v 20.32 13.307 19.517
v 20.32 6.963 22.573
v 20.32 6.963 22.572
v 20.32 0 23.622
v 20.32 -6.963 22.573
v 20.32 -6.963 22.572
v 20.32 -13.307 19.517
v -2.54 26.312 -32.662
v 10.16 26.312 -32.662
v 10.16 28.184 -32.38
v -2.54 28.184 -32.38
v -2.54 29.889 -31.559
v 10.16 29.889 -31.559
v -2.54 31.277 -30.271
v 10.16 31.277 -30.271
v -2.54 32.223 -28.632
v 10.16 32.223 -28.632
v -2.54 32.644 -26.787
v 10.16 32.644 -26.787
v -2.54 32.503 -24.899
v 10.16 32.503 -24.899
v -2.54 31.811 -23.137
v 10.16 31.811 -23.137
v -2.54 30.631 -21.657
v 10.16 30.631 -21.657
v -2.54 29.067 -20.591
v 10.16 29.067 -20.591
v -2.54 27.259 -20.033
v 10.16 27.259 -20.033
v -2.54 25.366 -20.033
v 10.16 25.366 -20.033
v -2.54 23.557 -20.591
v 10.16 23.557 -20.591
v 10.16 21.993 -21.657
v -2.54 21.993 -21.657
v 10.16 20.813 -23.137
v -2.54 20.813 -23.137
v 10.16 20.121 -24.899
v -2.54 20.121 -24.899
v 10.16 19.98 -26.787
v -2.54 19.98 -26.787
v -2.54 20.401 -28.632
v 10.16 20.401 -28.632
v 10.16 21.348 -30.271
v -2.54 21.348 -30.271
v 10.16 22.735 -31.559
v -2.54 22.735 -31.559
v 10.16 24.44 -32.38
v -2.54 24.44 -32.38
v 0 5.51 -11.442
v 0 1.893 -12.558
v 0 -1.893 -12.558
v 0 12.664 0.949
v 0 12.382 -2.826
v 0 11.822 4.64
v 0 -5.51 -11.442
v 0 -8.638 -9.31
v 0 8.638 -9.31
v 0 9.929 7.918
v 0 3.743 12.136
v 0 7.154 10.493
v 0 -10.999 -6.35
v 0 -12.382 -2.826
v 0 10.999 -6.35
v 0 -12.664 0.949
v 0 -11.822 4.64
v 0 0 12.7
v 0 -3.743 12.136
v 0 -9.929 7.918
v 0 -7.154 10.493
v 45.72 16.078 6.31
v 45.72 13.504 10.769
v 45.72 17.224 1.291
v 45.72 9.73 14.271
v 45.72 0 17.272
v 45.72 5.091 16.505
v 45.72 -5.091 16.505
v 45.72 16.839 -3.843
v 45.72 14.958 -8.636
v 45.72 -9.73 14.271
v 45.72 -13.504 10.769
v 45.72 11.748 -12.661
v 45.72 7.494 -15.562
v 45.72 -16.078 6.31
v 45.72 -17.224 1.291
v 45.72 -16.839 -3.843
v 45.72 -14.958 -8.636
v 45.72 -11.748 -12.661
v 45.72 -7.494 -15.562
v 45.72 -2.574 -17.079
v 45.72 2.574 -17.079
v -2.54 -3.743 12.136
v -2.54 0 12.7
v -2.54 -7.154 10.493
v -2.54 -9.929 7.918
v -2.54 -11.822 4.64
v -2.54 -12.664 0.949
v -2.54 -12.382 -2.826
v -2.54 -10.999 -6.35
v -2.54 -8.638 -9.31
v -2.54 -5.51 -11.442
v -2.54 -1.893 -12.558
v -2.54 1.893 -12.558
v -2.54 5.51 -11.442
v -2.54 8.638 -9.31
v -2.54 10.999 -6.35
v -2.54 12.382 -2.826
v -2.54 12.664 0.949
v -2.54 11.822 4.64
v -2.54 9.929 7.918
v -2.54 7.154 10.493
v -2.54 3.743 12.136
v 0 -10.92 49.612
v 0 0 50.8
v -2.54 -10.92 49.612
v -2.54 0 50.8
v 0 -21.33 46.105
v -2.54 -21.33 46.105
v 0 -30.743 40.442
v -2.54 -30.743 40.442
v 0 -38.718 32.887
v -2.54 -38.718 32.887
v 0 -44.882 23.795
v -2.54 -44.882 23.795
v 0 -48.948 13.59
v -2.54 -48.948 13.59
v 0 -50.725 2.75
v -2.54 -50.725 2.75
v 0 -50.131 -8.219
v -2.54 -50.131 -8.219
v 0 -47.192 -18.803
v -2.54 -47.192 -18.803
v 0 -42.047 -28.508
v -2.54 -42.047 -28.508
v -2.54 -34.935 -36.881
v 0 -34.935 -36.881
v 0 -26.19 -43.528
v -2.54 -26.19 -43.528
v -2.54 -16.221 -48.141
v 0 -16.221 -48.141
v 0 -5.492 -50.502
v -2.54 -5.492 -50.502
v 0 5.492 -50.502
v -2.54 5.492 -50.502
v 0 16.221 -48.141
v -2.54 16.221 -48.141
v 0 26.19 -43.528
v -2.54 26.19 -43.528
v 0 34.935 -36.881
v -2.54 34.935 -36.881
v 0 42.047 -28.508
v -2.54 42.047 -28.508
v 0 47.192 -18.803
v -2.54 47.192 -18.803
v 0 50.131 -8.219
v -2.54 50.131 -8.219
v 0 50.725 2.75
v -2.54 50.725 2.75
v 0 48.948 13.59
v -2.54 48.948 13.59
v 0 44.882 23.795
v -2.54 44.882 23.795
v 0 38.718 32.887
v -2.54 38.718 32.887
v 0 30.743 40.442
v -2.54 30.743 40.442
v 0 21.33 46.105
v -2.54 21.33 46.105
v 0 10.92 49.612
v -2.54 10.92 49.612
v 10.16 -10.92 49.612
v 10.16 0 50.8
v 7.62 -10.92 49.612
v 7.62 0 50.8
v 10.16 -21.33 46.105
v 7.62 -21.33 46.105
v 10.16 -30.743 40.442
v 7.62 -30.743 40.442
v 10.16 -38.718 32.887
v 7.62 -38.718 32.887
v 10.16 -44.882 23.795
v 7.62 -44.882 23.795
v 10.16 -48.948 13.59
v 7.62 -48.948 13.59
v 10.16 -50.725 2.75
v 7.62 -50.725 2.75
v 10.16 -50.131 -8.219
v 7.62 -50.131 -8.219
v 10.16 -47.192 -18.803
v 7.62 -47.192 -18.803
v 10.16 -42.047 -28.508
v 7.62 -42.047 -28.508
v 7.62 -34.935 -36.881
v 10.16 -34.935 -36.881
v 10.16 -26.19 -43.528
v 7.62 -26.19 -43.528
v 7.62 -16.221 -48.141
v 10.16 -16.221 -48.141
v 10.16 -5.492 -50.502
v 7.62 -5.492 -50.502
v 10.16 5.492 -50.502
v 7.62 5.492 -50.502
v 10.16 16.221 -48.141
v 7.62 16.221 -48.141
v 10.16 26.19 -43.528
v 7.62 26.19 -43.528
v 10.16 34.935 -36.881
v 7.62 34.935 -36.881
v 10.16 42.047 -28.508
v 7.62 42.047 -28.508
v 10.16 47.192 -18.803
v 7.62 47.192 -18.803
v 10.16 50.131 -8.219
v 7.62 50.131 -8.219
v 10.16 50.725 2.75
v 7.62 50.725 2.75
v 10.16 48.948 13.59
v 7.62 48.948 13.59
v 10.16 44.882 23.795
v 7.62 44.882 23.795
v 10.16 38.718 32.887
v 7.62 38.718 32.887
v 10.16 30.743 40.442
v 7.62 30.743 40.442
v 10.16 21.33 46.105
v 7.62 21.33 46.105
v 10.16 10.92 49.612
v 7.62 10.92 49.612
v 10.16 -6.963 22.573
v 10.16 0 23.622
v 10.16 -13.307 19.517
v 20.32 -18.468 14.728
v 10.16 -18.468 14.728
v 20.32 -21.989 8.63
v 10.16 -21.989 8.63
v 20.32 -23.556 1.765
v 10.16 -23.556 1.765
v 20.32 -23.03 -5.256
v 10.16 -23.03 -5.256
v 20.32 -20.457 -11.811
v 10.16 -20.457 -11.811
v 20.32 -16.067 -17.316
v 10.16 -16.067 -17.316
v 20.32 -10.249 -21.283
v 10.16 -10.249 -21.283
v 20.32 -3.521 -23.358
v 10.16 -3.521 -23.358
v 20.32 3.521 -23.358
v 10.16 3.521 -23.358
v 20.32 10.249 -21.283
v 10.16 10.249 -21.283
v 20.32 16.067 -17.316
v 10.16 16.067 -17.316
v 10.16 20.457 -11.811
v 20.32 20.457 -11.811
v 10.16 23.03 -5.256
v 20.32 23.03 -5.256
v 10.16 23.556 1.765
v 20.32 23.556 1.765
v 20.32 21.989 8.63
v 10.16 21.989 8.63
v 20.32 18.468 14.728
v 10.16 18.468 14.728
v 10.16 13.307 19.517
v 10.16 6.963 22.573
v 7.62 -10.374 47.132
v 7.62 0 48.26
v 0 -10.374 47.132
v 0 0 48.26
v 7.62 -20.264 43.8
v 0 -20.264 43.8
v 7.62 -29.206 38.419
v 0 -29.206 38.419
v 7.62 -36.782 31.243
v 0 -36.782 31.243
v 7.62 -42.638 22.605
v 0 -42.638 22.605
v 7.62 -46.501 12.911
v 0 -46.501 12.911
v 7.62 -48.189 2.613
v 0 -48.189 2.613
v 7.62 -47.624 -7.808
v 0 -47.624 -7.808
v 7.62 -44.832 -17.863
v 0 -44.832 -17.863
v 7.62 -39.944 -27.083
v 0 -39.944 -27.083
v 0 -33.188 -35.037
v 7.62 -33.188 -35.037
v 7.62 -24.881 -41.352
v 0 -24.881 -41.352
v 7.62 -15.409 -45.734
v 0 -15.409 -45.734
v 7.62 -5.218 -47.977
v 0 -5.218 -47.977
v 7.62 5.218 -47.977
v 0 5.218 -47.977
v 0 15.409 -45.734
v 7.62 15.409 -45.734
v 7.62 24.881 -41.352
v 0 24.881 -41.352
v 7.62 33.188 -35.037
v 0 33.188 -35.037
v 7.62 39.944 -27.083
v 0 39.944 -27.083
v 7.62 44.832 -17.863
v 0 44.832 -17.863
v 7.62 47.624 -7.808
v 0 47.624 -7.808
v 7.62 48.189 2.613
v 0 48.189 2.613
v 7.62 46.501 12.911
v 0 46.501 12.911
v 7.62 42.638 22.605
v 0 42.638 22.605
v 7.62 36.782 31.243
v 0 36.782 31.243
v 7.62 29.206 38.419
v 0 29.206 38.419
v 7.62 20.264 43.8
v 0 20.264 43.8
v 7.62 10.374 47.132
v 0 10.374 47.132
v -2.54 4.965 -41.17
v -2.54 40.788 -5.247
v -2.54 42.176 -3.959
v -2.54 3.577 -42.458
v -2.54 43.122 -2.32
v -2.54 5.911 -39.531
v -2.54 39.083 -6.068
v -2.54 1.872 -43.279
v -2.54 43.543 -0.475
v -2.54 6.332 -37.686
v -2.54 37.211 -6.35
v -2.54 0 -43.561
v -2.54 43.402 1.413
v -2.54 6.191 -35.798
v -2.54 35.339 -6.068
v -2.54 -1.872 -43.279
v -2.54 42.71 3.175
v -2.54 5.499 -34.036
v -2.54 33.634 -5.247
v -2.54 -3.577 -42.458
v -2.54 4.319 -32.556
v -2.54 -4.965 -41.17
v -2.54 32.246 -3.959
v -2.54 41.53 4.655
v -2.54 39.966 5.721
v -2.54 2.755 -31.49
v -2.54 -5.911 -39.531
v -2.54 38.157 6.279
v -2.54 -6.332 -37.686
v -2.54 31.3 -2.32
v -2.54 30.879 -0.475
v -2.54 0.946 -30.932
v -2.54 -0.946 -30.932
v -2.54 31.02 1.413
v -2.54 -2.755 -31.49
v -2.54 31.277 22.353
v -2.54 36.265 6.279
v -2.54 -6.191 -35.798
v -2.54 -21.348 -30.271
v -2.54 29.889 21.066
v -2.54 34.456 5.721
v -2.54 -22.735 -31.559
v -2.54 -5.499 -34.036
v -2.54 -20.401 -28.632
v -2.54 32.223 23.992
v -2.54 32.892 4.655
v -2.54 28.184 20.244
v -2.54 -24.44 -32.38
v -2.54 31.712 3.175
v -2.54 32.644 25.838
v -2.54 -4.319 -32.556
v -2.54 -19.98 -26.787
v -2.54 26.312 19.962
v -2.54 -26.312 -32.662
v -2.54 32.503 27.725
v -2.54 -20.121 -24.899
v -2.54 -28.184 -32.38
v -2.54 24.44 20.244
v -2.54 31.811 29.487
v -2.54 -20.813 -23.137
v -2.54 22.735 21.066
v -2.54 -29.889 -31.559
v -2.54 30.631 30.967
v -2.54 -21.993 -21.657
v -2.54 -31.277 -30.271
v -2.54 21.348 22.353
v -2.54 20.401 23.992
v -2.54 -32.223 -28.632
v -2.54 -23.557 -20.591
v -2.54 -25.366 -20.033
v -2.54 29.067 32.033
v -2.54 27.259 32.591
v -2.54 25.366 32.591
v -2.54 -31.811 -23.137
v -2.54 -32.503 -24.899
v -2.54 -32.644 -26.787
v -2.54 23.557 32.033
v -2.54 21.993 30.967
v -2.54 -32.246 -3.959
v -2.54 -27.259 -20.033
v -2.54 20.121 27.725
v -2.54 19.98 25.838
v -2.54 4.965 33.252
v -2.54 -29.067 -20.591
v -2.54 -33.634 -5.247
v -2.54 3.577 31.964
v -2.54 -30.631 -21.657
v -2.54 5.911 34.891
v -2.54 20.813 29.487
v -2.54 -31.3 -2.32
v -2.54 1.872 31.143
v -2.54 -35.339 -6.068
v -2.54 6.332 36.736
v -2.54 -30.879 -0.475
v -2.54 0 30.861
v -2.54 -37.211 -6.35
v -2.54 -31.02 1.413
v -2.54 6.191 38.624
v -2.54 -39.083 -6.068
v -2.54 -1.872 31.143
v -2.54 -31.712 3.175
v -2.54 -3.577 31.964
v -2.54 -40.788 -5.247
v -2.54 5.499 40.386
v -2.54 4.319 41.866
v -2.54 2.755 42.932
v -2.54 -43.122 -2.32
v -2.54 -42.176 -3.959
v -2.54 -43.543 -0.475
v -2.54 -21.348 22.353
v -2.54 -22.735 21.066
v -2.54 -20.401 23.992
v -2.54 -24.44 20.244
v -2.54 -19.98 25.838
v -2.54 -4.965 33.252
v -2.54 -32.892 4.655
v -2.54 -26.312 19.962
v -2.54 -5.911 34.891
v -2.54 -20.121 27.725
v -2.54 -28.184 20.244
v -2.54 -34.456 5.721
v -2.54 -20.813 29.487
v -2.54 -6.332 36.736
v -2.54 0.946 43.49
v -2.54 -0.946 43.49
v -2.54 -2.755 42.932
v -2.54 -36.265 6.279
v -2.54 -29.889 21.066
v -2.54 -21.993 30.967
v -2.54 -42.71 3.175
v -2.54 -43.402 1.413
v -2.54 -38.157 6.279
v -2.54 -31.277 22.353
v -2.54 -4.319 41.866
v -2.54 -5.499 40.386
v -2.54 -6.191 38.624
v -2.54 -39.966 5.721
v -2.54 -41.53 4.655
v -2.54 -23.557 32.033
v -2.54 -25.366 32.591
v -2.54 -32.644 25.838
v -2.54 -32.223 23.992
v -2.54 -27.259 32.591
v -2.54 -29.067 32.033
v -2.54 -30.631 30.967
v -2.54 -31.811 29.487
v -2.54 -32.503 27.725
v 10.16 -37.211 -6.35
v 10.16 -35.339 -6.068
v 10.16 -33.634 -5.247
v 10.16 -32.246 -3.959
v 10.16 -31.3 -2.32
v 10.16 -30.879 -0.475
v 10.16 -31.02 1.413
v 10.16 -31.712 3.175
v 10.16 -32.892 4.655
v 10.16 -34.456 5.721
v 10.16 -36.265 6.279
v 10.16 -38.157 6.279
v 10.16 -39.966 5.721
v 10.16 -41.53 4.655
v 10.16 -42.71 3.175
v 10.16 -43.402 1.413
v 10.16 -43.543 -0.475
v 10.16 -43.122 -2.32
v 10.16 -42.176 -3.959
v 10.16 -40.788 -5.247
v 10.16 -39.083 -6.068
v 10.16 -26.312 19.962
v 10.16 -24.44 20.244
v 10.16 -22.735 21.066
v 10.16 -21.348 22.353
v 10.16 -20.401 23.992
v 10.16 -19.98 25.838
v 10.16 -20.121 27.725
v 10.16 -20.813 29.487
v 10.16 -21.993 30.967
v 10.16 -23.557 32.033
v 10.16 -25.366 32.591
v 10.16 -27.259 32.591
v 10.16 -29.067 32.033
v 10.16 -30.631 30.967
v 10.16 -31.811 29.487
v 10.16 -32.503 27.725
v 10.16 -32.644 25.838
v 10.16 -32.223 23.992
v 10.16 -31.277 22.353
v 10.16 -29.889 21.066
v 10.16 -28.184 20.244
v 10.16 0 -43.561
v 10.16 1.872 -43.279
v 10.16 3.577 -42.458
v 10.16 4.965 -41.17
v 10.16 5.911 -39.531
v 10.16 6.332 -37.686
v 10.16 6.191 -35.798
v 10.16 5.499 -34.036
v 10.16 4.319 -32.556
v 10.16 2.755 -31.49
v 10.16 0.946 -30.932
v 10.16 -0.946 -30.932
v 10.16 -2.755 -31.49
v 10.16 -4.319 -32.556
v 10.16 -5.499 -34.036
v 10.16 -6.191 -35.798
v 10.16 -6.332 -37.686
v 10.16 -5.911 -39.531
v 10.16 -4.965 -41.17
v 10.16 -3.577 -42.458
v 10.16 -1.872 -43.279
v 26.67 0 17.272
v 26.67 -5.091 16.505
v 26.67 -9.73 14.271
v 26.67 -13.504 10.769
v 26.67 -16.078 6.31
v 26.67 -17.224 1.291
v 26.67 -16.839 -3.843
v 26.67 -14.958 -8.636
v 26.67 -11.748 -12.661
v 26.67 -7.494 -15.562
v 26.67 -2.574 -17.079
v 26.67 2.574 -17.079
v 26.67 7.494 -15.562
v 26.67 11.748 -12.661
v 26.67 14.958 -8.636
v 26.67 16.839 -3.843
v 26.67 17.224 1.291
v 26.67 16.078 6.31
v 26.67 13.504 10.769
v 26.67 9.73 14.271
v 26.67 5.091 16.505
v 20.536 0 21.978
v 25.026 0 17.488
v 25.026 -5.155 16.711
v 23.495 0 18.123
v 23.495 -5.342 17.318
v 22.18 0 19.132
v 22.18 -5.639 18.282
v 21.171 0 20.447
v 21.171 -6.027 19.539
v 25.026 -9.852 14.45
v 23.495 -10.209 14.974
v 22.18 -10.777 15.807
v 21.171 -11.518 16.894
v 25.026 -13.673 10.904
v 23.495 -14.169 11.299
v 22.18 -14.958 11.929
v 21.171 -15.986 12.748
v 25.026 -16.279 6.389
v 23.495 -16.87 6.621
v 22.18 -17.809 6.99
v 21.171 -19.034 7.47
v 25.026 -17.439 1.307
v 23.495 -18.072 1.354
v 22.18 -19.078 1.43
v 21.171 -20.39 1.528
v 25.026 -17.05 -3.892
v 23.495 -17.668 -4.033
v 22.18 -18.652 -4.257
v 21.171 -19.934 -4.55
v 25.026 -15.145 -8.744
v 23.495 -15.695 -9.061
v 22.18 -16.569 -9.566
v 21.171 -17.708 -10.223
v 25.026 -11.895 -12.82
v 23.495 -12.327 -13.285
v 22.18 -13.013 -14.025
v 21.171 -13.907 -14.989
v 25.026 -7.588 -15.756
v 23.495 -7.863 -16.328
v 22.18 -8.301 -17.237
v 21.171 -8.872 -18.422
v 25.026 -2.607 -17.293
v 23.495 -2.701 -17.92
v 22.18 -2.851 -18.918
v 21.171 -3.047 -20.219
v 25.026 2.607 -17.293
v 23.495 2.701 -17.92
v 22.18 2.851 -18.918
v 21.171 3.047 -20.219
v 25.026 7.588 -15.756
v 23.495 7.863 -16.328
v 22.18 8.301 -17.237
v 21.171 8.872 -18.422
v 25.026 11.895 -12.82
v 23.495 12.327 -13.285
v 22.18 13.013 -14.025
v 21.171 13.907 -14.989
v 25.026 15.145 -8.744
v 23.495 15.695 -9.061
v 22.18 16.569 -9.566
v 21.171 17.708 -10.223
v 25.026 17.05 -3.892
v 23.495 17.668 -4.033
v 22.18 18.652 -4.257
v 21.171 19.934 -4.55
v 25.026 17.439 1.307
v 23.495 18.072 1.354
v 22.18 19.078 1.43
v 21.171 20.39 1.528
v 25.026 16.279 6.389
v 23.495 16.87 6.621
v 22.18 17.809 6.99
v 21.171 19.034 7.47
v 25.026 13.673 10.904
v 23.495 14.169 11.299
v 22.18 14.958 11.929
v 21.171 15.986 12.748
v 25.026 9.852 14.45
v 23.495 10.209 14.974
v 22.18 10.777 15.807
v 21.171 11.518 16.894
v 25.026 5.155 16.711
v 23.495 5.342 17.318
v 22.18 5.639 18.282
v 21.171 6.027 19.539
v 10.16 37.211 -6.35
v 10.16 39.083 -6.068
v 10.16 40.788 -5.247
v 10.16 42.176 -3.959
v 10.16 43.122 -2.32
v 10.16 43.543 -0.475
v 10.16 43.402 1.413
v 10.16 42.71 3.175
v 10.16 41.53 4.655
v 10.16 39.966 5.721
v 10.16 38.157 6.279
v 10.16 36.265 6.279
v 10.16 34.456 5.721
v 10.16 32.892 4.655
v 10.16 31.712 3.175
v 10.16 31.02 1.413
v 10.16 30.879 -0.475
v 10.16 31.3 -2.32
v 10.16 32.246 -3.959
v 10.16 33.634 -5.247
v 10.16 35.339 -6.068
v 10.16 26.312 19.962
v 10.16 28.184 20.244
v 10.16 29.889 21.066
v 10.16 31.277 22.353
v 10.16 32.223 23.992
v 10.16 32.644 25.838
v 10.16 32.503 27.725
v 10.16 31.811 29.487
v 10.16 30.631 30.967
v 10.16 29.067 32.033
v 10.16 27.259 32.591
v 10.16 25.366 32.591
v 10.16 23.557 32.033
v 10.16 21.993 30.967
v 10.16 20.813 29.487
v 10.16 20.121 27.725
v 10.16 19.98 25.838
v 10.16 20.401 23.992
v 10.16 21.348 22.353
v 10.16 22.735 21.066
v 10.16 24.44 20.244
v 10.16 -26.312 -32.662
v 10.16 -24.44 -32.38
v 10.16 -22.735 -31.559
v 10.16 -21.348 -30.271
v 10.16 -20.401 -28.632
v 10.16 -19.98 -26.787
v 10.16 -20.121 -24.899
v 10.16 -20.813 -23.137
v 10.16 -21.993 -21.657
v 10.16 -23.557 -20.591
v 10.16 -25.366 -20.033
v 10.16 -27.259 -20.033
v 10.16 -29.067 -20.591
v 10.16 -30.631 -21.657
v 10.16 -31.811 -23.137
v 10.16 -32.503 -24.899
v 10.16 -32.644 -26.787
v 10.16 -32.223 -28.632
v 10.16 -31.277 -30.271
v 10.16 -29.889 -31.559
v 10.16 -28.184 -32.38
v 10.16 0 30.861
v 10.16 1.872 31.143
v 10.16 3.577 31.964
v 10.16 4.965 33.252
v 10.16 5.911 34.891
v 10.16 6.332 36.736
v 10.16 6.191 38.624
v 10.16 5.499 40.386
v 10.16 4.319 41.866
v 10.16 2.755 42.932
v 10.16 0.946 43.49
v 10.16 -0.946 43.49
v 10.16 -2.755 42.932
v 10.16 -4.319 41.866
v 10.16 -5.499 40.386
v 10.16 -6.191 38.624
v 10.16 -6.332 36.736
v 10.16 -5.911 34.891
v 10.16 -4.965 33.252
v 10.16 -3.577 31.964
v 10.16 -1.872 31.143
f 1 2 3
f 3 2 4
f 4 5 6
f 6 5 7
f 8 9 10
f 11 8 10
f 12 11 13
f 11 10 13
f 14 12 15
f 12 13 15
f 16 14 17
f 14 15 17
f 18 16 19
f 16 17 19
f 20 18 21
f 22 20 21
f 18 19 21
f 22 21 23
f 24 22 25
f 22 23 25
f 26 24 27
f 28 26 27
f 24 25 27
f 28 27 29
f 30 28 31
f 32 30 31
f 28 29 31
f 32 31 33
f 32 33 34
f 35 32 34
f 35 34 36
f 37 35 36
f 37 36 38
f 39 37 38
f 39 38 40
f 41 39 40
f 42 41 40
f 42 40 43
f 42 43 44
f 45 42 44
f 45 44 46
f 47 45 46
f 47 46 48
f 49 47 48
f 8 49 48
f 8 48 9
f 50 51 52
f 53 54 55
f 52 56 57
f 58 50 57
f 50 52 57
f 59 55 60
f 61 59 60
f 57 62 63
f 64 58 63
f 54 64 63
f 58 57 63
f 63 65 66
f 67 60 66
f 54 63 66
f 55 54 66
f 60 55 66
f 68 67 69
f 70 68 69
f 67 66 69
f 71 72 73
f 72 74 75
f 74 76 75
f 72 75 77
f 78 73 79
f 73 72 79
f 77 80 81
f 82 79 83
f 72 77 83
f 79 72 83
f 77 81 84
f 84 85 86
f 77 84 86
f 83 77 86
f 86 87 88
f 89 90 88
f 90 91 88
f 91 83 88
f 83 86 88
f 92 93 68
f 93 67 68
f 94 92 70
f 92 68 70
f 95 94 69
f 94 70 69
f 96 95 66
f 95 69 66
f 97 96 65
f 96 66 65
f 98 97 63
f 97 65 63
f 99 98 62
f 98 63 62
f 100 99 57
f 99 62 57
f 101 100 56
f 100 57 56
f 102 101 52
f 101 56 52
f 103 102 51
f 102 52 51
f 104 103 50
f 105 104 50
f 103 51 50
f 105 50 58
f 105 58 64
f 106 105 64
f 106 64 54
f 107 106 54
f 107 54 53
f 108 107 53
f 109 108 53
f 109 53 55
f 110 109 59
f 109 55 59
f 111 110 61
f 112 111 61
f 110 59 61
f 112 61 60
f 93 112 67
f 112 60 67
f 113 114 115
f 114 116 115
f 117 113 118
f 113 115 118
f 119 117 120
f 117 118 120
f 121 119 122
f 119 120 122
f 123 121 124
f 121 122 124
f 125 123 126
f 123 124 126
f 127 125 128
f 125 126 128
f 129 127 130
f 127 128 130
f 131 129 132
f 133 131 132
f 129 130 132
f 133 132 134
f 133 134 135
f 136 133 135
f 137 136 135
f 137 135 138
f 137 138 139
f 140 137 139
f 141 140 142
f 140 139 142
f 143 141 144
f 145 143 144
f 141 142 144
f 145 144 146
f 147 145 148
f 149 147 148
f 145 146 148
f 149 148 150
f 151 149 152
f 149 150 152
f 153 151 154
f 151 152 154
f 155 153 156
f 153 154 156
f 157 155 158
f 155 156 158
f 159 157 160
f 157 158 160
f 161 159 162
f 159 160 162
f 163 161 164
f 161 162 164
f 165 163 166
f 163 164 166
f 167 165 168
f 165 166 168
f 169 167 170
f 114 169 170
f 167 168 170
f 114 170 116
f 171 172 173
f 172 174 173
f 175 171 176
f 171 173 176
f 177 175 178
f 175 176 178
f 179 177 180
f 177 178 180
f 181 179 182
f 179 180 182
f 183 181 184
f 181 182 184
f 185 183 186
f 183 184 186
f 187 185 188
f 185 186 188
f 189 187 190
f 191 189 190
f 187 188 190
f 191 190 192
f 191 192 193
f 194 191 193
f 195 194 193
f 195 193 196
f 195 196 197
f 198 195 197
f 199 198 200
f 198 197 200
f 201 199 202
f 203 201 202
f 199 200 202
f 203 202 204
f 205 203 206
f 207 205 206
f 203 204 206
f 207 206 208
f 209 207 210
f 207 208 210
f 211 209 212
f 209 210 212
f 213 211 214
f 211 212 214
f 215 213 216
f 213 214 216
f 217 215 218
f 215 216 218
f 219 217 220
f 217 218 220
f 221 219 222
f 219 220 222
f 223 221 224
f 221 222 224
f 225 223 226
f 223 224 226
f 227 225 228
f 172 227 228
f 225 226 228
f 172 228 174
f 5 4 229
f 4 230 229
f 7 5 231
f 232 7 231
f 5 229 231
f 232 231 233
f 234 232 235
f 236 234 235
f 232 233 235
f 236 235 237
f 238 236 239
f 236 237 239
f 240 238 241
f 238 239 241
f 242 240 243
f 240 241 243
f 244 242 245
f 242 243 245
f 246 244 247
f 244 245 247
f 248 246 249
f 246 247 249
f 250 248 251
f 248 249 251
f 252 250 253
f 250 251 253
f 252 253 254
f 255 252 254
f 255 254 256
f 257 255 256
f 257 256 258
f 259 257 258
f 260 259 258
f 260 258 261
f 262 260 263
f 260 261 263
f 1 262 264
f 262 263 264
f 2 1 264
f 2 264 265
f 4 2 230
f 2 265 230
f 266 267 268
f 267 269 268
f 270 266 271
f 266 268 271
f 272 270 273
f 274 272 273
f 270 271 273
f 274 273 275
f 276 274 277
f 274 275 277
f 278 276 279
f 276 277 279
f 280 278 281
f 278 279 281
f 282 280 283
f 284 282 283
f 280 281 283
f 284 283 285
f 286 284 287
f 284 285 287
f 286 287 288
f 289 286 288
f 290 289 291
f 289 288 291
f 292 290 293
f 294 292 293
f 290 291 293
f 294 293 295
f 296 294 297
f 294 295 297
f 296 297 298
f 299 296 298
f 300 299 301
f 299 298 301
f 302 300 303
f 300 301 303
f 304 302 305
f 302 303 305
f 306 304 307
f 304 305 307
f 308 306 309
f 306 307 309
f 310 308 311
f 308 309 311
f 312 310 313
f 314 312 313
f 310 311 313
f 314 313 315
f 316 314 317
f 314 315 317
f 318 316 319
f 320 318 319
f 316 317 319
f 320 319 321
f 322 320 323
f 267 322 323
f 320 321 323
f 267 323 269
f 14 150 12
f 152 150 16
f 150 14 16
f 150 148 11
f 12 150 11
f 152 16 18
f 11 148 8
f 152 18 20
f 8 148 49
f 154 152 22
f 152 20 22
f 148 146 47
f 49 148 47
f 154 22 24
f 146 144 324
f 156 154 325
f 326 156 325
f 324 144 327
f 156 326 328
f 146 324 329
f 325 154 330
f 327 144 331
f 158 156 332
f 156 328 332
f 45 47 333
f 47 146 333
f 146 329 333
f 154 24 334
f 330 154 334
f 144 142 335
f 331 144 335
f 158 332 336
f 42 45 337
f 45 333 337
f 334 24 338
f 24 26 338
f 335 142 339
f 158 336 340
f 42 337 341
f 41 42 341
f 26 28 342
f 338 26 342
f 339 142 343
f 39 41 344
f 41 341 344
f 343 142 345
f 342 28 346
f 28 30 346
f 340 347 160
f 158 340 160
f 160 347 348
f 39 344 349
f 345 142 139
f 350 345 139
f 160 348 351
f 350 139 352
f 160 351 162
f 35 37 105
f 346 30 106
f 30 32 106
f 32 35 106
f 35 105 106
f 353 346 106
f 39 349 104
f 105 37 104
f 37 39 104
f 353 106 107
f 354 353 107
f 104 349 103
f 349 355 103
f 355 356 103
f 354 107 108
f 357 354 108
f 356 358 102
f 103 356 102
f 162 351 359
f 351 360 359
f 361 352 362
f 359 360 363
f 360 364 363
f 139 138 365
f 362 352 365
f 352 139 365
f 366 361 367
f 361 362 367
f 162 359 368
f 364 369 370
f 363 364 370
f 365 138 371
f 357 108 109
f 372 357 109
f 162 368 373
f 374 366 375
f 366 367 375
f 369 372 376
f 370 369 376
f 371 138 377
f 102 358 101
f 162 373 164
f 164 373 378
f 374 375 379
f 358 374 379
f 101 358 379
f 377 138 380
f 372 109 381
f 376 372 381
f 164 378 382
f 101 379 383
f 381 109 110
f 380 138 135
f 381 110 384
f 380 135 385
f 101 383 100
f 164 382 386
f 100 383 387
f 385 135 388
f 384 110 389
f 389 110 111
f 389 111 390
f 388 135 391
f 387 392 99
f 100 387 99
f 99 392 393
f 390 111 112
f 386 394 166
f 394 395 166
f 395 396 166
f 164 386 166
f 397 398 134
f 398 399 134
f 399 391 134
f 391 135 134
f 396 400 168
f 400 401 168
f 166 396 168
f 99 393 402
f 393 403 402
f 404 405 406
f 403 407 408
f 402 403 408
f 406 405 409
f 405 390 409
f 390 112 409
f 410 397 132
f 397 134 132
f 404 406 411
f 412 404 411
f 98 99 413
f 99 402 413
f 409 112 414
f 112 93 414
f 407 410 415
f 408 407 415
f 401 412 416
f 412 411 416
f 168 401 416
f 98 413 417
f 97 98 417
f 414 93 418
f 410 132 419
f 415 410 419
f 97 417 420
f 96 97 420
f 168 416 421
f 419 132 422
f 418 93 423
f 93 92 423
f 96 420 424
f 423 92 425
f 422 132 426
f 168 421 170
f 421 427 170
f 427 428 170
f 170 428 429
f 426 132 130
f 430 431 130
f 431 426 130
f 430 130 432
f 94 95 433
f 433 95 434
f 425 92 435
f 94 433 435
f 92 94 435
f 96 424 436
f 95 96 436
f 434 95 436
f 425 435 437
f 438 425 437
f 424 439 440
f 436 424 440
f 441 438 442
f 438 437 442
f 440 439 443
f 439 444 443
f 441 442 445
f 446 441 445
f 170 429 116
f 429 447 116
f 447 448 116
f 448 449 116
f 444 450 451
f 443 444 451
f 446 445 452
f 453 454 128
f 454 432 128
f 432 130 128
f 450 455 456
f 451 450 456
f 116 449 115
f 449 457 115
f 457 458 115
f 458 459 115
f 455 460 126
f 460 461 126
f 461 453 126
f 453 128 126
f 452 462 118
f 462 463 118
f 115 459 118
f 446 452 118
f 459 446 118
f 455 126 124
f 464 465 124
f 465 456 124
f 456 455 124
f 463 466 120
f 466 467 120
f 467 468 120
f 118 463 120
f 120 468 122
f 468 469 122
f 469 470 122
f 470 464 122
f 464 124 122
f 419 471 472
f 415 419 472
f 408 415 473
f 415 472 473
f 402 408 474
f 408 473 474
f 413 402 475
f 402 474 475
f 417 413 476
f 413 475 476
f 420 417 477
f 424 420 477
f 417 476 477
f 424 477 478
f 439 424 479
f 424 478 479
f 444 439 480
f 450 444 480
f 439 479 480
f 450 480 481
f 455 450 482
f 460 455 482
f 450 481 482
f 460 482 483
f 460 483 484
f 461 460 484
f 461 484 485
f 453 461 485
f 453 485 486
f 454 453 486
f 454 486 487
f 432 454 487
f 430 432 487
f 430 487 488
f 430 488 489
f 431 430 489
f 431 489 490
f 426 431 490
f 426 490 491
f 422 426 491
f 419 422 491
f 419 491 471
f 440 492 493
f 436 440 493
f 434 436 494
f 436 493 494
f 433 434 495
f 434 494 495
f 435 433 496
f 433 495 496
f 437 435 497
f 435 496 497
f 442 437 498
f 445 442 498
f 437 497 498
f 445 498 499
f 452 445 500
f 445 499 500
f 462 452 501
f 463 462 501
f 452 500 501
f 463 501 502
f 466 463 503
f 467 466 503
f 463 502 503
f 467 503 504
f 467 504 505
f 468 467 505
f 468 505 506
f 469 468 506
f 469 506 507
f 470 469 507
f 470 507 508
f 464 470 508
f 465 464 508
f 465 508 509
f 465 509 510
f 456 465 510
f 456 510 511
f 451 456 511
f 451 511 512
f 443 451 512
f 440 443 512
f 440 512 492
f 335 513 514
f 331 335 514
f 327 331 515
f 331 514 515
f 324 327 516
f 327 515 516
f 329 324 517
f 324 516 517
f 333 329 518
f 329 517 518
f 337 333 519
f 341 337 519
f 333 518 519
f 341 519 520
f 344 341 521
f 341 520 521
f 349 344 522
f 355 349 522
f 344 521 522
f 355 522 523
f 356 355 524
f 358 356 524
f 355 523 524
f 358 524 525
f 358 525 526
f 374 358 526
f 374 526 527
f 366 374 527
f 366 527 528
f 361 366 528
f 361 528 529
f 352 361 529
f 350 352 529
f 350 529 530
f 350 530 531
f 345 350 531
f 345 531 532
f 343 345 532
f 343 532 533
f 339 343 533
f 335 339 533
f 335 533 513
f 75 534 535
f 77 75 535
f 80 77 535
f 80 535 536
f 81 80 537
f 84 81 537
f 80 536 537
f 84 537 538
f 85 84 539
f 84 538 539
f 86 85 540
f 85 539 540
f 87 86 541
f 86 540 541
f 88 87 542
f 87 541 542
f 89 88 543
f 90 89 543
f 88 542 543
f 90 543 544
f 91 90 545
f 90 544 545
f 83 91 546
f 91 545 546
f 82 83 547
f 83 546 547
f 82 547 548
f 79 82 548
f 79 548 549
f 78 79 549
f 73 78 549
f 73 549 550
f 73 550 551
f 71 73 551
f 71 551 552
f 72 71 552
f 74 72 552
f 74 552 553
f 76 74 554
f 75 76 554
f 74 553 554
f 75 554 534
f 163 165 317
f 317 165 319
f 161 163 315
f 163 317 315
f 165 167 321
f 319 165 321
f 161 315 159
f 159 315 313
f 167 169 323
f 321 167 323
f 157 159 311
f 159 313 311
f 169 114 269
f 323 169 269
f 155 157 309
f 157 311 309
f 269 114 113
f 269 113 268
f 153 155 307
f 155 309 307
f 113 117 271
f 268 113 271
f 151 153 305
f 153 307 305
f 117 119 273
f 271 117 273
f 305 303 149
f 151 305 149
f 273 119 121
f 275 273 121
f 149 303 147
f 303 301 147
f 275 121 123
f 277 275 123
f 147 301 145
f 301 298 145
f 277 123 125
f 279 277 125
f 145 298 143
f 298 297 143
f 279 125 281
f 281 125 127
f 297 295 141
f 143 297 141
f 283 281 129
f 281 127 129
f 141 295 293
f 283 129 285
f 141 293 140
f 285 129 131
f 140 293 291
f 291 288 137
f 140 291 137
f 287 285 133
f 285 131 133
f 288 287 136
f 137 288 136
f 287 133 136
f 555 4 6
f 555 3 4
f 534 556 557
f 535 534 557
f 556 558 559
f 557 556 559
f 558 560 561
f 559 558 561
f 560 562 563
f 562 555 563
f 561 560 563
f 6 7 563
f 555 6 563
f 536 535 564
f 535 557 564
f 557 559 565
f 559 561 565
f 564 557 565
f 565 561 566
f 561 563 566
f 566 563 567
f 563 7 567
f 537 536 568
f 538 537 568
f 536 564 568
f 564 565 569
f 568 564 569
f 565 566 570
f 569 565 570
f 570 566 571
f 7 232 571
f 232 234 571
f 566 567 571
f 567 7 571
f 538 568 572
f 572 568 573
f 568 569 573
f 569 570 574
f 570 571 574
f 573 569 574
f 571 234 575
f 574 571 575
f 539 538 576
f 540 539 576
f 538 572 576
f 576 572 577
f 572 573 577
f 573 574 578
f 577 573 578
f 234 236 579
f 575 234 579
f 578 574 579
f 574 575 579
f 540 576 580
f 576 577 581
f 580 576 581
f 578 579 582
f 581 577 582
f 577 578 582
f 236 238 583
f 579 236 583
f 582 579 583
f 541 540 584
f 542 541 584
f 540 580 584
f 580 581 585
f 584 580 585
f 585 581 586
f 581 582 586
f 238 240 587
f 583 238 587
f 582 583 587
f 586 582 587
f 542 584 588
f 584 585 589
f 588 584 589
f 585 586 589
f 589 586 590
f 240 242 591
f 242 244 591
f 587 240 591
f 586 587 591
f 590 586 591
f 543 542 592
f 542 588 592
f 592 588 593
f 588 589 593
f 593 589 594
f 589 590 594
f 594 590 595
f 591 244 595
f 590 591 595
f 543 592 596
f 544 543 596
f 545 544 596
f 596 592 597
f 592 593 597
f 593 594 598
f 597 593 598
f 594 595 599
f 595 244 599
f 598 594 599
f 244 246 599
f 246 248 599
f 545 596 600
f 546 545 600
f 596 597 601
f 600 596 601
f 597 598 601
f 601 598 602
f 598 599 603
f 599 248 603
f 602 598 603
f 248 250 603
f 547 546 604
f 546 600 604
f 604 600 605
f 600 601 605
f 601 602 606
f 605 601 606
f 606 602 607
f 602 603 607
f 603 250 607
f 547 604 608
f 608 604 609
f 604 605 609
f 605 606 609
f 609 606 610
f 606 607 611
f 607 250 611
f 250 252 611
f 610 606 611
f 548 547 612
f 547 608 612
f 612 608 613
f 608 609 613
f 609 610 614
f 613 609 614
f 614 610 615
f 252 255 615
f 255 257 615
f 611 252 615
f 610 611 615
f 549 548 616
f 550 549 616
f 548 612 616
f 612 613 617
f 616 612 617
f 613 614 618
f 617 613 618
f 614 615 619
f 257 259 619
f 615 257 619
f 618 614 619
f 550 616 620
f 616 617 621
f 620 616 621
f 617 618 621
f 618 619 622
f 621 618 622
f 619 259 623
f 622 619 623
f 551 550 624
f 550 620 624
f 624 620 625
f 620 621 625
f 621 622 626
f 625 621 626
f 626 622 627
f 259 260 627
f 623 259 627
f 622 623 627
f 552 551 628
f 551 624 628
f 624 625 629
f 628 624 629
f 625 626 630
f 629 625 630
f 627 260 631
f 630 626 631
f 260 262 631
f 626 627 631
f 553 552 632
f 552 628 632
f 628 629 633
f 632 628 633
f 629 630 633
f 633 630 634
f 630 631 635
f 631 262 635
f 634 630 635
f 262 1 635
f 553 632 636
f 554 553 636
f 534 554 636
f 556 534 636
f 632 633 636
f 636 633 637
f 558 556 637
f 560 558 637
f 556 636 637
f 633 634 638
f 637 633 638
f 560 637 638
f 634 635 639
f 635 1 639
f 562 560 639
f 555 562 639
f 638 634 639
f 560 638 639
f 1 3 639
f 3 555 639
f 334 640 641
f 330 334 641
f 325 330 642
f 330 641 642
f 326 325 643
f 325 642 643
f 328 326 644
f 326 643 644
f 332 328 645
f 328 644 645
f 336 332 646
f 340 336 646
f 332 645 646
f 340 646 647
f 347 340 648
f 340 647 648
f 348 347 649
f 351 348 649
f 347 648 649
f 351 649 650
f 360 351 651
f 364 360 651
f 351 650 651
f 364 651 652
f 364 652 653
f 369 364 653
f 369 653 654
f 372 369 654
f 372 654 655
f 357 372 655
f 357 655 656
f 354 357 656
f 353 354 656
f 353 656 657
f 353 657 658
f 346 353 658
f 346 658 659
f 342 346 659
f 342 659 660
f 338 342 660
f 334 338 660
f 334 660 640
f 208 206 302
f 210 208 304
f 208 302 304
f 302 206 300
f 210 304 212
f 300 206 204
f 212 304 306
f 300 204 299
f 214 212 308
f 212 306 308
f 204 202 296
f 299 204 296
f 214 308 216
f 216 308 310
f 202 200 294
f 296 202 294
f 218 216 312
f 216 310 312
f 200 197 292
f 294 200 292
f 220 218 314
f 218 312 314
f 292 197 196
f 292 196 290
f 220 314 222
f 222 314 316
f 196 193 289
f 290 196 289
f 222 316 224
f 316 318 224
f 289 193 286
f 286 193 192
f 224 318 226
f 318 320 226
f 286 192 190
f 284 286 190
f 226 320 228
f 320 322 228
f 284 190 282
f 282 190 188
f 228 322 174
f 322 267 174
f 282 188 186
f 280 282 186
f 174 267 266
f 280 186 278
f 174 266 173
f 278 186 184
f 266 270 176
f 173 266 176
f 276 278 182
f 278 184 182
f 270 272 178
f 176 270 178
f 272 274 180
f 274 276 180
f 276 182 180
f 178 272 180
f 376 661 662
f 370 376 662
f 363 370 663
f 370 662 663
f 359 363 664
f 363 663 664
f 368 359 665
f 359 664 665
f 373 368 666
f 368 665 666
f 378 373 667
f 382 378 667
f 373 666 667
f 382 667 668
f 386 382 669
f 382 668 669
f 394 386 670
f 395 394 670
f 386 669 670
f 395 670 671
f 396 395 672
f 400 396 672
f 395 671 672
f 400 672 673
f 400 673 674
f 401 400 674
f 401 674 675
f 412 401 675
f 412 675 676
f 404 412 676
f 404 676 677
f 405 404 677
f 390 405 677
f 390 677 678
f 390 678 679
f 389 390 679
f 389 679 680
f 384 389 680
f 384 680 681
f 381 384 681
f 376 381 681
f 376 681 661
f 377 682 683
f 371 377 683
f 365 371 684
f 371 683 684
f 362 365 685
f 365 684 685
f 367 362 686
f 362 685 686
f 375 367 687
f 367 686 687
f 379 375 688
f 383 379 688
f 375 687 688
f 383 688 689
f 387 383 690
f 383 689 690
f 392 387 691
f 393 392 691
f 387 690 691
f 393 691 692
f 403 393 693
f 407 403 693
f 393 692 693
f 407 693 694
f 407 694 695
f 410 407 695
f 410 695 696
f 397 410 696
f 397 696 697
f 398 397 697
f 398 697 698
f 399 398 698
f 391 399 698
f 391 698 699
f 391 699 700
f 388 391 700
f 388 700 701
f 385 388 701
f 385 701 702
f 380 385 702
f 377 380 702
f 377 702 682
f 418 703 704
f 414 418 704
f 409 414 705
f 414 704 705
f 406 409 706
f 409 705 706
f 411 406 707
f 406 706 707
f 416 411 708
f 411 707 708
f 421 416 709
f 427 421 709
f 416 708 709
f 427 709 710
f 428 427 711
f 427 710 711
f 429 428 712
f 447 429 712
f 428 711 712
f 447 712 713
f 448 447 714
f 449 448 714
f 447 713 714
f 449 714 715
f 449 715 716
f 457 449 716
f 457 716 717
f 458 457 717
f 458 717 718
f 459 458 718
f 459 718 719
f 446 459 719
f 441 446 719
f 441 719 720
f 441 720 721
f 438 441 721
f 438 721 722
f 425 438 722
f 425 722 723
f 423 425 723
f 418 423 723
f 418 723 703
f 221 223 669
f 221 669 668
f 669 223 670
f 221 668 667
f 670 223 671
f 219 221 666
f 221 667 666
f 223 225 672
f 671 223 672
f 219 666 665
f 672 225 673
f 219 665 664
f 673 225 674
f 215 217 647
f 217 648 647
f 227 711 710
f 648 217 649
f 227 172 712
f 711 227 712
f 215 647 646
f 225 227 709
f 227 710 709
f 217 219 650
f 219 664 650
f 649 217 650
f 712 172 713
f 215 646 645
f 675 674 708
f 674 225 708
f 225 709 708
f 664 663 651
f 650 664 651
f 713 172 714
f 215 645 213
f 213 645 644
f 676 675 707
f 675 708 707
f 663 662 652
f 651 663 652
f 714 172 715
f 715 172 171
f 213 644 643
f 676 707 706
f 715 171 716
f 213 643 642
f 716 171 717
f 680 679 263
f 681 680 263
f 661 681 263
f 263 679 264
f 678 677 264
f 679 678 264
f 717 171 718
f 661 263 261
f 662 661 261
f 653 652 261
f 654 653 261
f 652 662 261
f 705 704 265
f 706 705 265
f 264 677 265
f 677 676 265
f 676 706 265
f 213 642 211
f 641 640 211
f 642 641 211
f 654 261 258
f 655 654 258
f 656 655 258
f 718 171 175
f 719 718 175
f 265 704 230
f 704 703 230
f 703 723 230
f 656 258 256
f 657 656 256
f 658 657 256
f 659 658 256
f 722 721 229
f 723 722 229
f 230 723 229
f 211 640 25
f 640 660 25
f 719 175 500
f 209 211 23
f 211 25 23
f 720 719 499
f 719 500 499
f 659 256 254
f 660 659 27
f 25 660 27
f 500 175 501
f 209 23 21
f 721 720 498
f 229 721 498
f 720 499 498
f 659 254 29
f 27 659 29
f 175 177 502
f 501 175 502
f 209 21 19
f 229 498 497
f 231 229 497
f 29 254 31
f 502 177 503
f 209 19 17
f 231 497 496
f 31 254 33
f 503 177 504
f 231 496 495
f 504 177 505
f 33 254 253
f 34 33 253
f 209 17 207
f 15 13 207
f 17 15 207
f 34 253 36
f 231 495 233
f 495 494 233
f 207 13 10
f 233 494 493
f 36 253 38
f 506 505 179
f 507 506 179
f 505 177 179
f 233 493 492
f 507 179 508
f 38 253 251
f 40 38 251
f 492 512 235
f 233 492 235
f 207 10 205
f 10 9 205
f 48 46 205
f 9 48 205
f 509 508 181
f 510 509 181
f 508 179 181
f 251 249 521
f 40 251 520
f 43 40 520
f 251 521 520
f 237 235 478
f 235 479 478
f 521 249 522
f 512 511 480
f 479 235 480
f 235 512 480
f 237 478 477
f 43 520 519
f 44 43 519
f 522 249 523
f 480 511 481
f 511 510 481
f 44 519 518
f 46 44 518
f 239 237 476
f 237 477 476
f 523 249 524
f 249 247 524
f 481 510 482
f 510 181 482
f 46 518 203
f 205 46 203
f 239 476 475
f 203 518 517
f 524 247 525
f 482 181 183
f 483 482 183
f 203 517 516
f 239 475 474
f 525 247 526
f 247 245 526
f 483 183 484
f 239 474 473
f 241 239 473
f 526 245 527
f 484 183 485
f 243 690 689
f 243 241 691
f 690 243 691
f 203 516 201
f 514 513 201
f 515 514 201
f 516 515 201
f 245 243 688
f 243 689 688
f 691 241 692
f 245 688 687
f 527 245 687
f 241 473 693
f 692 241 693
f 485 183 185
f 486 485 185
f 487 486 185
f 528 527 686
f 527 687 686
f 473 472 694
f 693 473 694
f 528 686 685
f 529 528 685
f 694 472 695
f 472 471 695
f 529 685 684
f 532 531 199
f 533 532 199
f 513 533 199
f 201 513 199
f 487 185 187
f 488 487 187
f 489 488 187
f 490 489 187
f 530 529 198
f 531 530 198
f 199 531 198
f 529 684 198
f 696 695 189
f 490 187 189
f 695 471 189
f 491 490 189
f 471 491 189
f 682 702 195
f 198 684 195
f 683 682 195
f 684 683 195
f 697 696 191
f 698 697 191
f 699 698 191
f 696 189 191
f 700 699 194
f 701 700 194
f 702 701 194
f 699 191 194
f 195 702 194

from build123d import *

# Parameters (mm, degrees)
SKETCH3_R          = 6.35
CUT_EXTRUDE1_DEPTH = 81.161047897
FILLET1_R          = 6.35


with BuildPart() as part:
    # Sketch2 → Revolve1 (revolve)
    with BuildSketch(Plane.XY, mode=Mode.PRIVATE) as revolve1_sk:
        Polygon((45.72, 17.272), (20.32, 17.272), (20.32, 23.622), (10.16, 23.622), (10.16, 50.8), (7.62, 50.8), (7.62, 48.26), (0, 48.26), (0, 50.8), (-2.54, 50.8), (-2.54, 12.7), (0, 12.7), (0, 0), (45.72, 0), align=None)
    revolve(revolve1_sk.sketch.rotate(Axis((-1001.184765233, 0, 0), (1, 0, 0)), 90), axis=Axis((-1001.184765233, 0, 0), (1, 0, 0)))

    # Sketch3 → Cut-Extrude1 (cut, through all)
    with BuildSketch(Plane(origin=(10.16, 0, 0), x_dir=(0, 0, -1), z_dir=(1, 0, 0))):
        with Locations((26.312150435, 26.312150435)):
            Circle(SKETCH3_R)
        with Locations((0, 37.211)):
            Circle(SKETCH3_R)
        with Locations((37.211, 0)):
            Circle(SKETCH3_R)
        with Locations((26.312150435, -26.312150435)):
            Circle(SKETCH3_R)
        with Locations((0, -37.211)):
            Circle(SKETCH3_R)
        with Locations((-26.312150435, -26.312150435)):
            Circle(SKETCH3_R)
        with Locations((-37.211, 0)):
            Circle(SKETCH3_R)
        with Locations((-26.312150435, 26.312150435)):
            Circle(SKETCH3_R)
    extrude(amount=-CUT_EXTRUDE1_DEPTH, mode=Mode.SUBTRACT)

    # Fillet1
    fillet1_edges = [part.edges().sort_by_distance(p)[0] for p in [
        (20.32, 0, -17.272),
    ]]
    fillet(fillet1_edges, radius=FILLET1_R - 0.0001)  # a hair under: the kernel refuses the full size


solid = part.part
